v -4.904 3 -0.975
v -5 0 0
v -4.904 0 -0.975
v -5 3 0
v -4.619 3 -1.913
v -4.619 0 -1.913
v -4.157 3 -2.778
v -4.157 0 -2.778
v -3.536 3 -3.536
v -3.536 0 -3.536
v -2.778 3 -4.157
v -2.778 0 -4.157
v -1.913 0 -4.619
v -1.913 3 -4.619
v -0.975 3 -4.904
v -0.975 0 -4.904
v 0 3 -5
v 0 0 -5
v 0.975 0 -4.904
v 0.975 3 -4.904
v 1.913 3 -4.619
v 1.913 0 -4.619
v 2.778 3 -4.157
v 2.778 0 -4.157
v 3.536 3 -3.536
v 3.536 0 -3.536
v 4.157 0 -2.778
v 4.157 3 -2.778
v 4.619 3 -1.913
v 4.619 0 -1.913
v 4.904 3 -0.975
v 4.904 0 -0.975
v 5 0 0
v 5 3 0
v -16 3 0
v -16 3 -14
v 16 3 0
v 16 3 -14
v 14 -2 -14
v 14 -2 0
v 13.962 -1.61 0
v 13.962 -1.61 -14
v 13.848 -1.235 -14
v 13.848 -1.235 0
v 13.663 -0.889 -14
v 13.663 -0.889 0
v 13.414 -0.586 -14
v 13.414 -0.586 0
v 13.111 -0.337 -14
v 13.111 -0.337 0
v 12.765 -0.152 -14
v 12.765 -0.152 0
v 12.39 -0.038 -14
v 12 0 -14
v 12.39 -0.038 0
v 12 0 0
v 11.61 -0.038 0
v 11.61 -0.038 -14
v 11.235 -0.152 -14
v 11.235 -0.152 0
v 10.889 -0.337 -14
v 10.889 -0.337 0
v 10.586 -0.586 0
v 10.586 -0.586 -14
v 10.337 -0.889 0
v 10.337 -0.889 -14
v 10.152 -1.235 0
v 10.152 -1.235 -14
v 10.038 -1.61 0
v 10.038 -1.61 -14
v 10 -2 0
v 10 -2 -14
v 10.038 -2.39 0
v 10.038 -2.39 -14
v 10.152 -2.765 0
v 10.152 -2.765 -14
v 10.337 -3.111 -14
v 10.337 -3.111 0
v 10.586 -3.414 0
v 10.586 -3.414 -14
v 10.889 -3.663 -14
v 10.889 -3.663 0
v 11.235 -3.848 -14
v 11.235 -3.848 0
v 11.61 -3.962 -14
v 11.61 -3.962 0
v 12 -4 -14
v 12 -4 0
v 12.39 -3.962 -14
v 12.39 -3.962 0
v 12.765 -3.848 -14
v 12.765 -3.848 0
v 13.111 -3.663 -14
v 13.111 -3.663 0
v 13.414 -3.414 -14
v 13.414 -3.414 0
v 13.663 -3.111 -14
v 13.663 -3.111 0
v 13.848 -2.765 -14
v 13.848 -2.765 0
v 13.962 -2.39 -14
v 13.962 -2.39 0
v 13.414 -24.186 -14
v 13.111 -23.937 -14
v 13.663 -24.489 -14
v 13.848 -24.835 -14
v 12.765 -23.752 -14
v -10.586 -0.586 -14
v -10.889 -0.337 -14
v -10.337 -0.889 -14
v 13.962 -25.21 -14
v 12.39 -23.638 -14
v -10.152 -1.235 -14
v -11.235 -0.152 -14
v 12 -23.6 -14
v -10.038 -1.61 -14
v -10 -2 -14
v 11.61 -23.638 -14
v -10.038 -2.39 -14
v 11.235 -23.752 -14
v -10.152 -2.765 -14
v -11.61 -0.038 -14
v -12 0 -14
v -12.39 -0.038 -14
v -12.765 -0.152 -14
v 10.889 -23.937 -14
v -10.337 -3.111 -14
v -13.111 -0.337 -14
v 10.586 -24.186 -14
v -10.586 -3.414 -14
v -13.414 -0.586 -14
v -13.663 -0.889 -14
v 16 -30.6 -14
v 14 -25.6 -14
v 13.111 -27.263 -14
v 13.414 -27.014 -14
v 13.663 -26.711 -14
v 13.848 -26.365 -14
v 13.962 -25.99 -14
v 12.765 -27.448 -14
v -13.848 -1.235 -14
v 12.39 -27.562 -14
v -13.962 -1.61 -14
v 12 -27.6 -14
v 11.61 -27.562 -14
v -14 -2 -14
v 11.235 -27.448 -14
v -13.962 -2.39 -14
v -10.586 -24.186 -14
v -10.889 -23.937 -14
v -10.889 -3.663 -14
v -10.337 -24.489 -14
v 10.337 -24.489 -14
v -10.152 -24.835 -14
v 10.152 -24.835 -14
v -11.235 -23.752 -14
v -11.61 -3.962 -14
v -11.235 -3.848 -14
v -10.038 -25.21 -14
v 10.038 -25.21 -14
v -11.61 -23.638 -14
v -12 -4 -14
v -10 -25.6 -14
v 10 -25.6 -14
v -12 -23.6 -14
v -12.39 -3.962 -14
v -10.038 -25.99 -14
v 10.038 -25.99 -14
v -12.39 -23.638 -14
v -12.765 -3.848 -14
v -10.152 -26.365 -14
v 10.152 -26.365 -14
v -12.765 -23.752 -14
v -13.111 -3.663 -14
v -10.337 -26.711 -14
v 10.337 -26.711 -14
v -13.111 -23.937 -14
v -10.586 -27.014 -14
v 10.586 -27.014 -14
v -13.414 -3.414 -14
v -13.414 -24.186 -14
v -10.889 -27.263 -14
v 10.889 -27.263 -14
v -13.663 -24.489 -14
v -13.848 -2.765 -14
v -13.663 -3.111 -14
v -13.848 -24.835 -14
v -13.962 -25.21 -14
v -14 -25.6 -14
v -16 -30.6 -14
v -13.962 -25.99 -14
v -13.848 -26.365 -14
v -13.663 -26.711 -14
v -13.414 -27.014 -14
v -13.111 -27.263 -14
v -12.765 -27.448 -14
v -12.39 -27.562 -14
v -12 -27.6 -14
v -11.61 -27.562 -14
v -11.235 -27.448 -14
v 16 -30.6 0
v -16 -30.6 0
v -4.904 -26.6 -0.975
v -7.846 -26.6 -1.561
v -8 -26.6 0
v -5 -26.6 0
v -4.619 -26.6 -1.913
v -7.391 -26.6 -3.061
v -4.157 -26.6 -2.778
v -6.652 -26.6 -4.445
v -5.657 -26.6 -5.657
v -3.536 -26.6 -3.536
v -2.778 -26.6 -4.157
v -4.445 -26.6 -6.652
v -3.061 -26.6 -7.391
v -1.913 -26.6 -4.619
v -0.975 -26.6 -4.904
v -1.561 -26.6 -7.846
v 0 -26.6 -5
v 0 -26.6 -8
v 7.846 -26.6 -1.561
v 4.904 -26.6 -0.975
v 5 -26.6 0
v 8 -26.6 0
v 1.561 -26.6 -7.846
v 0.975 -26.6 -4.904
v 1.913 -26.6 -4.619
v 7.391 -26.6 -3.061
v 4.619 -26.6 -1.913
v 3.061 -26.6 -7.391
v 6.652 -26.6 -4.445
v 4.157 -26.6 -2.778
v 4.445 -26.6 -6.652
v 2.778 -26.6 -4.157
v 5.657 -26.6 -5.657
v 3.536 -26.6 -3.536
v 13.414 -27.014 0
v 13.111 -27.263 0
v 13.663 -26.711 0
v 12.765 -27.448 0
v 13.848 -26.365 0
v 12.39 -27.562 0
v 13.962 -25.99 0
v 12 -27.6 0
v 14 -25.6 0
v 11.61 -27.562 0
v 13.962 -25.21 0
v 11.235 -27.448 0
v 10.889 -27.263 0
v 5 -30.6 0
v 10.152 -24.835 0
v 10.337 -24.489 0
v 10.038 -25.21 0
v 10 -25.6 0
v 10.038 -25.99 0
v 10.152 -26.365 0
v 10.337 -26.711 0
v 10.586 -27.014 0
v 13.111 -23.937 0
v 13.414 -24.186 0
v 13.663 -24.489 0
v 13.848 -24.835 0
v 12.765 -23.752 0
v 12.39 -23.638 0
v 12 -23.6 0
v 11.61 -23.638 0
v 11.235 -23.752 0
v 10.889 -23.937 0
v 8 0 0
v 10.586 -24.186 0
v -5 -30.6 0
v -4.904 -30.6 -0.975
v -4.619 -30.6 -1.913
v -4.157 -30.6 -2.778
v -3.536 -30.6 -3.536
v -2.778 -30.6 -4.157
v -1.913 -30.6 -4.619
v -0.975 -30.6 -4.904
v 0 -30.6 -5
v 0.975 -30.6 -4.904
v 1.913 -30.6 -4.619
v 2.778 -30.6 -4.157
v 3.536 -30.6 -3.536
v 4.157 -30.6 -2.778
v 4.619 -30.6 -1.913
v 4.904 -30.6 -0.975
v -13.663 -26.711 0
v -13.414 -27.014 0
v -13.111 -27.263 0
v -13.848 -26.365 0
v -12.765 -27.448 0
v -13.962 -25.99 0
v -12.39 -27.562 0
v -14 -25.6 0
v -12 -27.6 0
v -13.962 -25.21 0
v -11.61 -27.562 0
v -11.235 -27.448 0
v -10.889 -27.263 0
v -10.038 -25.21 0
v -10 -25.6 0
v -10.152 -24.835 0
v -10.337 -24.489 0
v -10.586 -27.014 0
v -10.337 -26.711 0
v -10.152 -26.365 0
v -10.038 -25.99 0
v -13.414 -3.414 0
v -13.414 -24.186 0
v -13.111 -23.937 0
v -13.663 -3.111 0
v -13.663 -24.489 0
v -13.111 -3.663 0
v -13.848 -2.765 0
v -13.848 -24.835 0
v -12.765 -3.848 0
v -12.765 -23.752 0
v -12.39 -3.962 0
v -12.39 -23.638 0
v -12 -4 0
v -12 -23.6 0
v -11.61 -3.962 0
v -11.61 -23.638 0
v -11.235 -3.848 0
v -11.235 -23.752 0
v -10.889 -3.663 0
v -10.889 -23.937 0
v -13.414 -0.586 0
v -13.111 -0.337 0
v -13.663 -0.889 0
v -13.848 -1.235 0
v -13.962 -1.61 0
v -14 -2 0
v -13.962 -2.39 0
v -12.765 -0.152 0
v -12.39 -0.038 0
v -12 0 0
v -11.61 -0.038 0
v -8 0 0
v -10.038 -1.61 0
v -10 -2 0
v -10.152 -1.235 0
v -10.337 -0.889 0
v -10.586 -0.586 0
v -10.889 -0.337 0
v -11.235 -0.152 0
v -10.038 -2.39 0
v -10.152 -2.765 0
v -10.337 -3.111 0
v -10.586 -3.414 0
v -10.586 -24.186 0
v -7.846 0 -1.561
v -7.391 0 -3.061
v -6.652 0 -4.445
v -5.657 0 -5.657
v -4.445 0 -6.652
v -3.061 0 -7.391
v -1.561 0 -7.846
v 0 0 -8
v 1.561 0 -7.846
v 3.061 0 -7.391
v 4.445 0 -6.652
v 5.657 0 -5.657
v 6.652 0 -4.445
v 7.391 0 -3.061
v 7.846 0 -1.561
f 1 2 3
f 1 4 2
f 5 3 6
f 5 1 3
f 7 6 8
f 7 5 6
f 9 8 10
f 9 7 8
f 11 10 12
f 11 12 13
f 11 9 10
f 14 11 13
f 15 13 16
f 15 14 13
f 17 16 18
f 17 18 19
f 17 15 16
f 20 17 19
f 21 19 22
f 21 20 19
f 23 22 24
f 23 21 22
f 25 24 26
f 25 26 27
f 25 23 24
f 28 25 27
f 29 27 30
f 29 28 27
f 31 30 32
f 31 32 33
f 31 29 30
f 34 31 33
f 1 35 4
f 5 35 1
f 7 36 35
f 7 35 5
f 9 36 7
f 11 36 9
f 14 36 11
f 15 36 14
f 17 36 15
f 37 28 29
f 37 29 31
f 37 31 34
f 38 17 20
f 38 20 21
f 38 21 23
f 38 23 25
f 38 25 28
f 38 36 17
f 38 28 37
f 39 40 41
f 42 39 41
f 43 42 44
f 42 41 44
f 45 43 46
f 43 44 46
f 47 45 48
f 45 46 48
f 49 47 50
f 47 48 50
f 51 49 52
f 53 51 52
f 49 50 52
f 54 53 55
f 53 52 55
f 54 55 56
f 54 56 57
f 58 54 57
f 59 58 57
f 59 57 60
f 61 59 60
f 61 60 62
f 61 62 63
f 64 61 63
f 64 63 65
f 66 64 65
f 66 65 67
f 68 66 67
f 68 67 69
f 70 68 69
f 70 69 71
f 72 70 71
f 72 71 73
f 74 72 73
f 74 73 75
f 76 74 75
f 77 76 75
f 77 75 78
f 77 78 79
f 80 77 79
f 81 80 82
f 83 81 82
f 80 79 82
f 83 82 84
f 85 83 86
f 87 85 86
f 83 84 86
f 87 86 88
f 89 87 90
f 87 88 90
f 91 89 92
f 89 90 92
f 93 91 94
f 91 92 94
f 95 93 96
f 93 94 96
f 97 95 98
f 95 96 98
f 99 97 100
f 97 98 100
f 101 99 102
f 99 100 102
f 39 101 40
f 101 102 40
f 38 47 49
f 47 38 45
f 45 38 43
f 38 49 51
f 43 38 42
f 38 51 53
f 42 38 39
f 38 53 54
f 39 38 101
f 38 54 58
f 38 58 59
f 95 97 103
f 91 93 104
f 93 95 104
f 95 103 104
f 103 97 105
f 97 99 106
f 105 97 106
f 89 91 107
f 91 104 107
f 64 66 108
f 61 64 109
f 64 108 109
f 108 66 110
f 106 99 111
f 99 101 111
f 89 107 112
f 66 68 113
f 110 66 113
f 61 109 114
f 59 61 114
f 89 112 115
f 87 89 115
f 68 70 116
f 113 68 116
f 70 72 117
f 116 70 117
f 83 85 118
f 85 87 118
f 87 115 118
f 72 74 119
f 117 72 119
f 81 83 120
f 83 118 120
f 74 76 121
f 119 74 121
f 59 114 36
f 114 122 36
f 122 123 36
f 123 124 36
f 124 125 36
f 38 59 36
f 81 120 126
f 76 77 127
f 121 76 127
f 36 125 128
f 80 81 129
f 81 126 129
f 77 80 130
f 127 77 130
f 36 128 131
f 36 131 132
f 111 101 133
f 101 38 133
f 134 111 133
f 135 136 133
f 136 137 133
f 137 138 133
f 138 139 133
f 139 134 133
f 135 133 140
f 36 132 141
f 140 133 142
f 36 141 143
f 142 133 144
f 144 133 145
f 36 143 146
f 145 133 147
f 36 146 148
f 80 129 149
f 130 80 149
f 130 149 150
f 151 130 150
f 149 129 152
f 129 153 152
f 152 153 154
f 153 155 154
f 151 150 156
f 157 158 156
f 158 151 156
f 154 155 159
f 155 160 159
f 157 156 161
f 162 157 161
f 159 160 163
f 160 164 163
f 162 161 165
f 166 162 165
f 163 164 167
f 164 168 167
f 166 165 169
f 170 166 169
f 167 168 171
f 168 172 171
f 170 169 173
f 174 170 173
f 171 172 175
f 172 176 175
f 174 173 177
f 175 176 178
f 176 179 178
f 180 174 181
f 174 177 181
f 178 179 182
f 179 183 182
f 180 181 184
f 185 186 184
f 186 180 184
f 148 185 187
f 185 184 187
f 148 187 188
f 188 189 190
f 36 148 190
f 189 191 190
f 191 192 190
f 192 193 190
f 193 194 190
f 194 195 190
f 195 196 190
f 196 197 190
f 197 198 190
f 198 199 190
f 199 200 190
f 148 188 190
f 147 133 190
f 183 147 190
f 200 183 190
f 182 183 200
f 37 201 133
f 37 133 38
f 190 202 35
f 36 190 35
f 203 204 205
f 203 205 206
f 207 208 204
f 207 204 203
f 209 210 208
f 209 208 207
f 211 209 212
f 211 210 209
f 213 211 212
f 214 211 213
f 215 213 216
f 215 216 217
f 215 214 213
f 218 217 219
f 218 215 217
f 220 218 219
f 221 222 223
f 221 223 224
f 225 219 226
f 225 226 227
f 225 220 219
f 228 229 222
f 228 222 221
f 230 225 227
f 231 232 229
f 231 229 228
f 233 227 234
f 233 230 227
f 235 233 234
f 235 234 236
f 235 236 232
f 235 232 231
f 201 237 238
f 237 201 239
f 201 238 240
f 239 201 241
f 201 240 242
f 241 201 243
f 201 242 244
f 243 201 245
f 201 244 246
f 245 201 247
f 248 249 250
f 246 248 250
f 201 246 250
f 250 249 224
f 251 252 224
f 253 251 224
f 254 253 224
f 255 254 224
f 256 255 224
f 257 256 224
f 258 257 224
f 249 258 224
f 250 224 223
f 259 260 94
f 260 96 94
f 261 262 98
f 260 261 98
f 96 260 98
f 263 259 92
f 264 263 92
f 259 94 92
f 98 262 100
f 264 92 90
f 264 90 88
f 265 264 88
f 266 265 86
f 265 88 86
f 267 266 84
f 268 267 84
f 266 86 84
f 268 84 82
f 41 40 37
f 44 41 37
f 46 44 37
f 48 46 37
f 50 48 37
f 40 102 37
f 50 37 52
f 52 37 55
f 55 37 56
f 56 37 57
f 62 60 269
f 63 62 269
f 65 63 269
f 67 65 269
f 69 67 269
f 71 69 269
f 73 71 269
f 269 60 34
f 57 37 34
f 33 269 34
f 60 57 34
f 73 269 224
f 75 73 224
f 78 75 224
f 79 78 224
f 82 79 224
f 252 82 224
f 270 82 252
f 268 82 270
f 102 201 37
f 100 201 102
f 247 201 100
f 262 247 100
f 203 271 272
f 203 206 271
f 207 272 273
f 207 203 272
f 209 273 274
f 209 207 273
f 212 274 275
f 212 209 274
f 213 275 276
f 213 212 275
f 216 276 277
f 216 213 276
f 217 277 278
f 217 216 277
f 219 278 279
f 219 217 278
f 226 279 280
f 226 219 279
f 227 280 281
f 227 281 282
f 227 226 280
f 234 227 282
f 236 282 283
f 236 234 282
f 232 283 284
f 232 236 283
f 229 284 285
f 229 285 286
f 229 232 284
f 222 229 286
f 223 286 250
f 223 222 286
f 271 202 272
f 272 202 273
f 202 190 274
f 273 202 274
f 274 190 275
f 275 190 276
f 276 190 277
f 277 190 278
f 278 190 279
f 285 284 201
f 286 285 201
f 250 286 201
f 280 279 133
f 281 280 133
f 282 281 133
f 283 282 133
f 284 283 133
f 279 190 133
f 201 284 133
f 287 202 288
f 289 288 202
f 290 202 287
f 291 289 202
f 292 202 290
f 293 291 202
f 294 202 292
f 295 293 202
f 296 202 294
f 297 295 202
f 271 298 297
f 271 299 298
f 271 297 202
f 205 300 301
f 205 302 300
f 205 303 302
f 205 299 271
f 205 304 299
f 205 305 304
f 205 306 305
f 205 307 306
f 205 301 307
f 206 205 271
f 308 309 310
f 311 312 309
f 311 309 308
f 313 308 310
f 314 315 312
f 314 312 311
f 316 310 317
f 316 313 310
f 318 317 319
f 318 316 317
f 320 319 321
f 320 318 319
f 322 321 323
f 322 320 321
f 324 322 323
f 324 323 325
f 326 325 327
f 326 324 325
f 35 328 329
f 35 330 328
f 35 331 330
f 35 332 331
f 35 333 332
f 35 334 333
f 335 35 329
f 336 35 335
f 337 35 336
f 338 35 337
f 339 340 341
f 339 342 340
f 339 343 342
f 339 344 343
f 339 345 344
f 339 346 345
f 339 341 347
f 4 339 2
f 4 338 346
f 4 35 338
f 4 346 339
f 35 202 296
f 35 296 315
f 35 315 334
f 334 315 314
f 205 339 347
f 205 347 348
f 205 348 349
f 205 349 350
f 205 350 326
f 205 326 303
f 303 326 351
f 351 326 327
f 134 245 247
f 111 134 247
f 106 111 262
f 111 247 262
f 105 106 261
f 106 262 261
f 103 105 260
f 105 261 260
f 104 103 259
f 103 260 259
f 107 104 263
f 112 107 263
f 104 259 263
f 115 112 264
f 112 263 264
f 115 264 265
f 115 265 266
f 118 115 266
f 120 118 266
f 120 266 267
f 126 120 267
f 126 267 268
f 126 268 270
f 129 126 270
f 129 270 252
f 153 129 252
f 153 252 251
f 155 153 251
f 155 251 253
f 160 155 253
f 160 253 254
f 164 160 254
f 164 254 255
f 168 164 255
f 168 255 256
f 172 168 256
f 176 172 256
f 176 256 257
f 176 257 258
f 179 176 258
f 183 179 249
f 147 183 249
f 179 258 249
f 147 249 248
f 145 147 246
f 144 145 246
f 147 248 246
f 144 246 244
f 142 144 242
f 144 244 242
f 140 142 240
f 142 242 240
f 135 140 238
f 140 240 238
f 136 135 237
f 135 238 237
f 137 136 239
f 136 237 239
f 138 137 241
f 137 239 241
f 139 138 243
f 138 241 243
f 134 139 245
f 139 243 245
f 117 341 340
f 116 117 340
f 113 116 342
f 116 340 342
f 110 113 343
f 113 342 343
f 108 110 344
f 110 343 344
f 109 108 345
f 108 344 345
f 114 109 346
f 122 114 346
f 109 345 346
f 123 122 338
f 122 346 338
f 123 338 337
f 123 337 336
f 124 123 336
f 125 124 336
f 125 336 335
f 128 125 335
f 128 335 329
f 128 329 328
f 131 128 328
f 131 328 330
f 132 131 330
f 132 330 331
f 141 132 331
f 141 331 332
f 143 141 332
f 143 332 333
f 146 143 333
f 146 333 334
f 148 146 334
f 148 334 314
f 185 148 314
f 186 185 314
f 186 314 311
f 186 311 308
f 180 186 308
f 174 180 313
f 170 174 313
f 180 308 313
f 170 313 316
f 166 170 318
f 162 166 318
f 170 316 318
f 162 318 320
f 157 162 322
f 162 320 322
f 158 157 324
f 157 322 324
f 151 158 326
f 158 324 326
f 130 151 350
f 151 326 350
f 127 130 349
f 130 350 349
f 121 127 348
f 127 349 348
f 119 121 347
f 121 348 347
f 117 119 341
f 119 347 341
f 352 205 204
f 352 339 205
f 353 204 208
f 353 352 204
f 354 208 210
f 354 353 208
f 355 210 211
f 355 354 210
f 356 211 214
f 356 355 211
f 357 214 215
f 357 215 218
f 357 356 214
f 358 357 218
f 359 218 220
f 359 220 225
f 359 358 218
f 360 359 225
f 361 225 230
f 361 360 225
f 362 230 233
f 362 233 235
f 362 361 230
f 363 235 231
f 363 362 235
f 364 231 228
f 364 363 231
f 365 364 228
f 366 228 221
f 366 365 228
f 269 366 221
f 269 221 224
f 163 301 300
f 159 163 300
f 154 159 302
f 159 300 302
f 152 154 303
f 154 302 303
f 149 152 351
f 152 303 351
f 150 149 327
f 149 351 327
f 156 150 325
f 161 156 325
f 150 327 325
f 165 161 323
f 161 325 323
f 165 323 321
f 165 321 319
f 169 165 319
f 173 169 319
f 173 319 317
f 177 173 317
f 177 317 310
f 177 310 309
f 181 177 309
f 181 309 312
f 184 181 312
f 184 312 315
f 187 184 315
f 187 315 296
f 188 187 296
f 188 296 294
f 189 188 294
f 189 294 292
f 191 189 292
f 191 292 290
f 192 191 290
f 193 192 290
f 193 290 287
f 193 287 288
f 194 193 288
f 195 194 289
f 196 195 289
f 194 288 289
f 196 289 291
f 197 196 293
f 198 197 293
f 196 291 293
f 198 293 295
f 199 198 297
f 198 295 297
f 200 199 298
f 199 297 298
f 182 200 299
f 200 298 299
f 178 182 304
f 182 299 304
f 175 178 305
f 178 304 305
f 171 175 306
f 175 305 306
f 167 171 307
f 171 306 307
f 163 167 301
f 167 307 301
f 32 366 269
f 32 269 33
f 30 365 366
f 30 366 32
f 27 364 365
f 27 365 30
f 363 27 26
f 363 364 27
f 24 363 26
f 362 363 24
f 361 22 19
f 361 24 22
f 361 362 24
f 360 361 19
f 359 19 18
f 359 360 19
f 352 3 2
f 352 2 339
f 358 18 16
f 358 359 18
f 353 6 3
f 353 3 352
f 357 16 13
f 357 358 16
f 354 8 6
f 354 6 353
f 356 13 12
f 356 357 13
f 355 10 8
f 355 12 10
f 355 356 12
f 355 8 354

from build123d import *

# Parameters (mm, degrees)
REVOLUCI_N1_ANGLE         = 180
CROQUIS2_W                = 8
CROQUIS2_H                = 33.6
SALIENTE_EXTRUIR1_DEPTH   = 14
SALIENTE_EXTRUIR1_2_DEPTH = 14
SALIENTE_EXTRUIR2_START   = -33.6
SALIENTE_EXTRUIR2_DEPTH   = 33.6
CROQUIS4_R                = 2
CORTAR_EXTRUIR1_DEPTH     = 26


# Read off the part's stored shape, not the designer's step: Saliente-Extruir2
with BuildPart() as part:
    # Croquis1 → Revolución1 (revolve)
    with BuildSketch(Plane.XY):
        Polygon((-8, 0), (-5, 0), (-5, 3), (-14, 3), (-14, -30.6), (-5, -30.6), (-5, -26.6), (-8, -26.6), align=None)
    revolve(axis=Axis((0, 0, 0), (0, -1, 0)), revolution_arc=REVOLUCI_N1_ANGLE)



with BuildPart() as body_2:
    # Croquis2 → Saliente-Extruir1 (new body)
    with BuildSketch(Plane.XY):
        with Locations((-12, -13.8)):
            Rectangle(CROQUIS2_W, CROQUIS2_H)
    extrude(amount=-SALIENTE_EXTRUIR1_DEPTH)


with BuildPart() as body_3:
    # Croquis2 → Saliente-Extruir1 2 (new body)
    with BuildSketch(Plane.XY):
        with Locations((12, -13.8)):
            Rectangle(CROQUIS2_W, CROQUIS2_H)
    extrude(amount=-SALIENTE_EXTRUIR1_2_DEPTH)


with BuildPart() as part_1:
    add(part.part)

    add(body_2.part)  # Saliente-Extruir2 merges body 2

    add(body_3.part)  # Saliente-Extruir2 merges body 3
    # Saliente-Extruir2 outline → Saliente-Extruir2 (add)
    with BuildSketch(Plane(origin=(0, 3, 0), x_dir=(1, 0, 0), z_dir=(0, 1, 0)).offset(SALIENTE_EXTRUIR2_START)):
        with BuildLine():
            Line((8, 14), (0, 14))
            ThreePointArc((0, 14), (4.192388692, 13.357540082), (8, 11.489125293))
            Line((8, 11.489125293), (8, 14))
        make_face()
        with BuildLine():
            Line((0, 14), (-8, 14))
            Line((-8, 14), (-8, 11.489125293))
            ThreePointArc((-8, 11.489125293), (-4.192388692, 13.357540082), (0, 14))
        make_face()
    extrude(amount=SALIENTE_EXTRUIR2_DEPTH)

    # Croquis4 → Cortar-Extruir1 (cut)
    with BuildSketch(Plane.XY):
        with Locations((-12, -2)):
            Circle(CROQUIS4_R)
        with Locations((12, -2)):
            Circle(CROQUIS4_R)
        with Locations((-12, -25.6)):
            Circle(CROQUIS4_R)
        with Locations((12, -25.6)):
            Circle(CROQUIS4_R)
    extrude(amount=-CORTAR_EXTRUIR1_DEPTH, mode=Mode.SUBTRACT)


solid = part_1.part
